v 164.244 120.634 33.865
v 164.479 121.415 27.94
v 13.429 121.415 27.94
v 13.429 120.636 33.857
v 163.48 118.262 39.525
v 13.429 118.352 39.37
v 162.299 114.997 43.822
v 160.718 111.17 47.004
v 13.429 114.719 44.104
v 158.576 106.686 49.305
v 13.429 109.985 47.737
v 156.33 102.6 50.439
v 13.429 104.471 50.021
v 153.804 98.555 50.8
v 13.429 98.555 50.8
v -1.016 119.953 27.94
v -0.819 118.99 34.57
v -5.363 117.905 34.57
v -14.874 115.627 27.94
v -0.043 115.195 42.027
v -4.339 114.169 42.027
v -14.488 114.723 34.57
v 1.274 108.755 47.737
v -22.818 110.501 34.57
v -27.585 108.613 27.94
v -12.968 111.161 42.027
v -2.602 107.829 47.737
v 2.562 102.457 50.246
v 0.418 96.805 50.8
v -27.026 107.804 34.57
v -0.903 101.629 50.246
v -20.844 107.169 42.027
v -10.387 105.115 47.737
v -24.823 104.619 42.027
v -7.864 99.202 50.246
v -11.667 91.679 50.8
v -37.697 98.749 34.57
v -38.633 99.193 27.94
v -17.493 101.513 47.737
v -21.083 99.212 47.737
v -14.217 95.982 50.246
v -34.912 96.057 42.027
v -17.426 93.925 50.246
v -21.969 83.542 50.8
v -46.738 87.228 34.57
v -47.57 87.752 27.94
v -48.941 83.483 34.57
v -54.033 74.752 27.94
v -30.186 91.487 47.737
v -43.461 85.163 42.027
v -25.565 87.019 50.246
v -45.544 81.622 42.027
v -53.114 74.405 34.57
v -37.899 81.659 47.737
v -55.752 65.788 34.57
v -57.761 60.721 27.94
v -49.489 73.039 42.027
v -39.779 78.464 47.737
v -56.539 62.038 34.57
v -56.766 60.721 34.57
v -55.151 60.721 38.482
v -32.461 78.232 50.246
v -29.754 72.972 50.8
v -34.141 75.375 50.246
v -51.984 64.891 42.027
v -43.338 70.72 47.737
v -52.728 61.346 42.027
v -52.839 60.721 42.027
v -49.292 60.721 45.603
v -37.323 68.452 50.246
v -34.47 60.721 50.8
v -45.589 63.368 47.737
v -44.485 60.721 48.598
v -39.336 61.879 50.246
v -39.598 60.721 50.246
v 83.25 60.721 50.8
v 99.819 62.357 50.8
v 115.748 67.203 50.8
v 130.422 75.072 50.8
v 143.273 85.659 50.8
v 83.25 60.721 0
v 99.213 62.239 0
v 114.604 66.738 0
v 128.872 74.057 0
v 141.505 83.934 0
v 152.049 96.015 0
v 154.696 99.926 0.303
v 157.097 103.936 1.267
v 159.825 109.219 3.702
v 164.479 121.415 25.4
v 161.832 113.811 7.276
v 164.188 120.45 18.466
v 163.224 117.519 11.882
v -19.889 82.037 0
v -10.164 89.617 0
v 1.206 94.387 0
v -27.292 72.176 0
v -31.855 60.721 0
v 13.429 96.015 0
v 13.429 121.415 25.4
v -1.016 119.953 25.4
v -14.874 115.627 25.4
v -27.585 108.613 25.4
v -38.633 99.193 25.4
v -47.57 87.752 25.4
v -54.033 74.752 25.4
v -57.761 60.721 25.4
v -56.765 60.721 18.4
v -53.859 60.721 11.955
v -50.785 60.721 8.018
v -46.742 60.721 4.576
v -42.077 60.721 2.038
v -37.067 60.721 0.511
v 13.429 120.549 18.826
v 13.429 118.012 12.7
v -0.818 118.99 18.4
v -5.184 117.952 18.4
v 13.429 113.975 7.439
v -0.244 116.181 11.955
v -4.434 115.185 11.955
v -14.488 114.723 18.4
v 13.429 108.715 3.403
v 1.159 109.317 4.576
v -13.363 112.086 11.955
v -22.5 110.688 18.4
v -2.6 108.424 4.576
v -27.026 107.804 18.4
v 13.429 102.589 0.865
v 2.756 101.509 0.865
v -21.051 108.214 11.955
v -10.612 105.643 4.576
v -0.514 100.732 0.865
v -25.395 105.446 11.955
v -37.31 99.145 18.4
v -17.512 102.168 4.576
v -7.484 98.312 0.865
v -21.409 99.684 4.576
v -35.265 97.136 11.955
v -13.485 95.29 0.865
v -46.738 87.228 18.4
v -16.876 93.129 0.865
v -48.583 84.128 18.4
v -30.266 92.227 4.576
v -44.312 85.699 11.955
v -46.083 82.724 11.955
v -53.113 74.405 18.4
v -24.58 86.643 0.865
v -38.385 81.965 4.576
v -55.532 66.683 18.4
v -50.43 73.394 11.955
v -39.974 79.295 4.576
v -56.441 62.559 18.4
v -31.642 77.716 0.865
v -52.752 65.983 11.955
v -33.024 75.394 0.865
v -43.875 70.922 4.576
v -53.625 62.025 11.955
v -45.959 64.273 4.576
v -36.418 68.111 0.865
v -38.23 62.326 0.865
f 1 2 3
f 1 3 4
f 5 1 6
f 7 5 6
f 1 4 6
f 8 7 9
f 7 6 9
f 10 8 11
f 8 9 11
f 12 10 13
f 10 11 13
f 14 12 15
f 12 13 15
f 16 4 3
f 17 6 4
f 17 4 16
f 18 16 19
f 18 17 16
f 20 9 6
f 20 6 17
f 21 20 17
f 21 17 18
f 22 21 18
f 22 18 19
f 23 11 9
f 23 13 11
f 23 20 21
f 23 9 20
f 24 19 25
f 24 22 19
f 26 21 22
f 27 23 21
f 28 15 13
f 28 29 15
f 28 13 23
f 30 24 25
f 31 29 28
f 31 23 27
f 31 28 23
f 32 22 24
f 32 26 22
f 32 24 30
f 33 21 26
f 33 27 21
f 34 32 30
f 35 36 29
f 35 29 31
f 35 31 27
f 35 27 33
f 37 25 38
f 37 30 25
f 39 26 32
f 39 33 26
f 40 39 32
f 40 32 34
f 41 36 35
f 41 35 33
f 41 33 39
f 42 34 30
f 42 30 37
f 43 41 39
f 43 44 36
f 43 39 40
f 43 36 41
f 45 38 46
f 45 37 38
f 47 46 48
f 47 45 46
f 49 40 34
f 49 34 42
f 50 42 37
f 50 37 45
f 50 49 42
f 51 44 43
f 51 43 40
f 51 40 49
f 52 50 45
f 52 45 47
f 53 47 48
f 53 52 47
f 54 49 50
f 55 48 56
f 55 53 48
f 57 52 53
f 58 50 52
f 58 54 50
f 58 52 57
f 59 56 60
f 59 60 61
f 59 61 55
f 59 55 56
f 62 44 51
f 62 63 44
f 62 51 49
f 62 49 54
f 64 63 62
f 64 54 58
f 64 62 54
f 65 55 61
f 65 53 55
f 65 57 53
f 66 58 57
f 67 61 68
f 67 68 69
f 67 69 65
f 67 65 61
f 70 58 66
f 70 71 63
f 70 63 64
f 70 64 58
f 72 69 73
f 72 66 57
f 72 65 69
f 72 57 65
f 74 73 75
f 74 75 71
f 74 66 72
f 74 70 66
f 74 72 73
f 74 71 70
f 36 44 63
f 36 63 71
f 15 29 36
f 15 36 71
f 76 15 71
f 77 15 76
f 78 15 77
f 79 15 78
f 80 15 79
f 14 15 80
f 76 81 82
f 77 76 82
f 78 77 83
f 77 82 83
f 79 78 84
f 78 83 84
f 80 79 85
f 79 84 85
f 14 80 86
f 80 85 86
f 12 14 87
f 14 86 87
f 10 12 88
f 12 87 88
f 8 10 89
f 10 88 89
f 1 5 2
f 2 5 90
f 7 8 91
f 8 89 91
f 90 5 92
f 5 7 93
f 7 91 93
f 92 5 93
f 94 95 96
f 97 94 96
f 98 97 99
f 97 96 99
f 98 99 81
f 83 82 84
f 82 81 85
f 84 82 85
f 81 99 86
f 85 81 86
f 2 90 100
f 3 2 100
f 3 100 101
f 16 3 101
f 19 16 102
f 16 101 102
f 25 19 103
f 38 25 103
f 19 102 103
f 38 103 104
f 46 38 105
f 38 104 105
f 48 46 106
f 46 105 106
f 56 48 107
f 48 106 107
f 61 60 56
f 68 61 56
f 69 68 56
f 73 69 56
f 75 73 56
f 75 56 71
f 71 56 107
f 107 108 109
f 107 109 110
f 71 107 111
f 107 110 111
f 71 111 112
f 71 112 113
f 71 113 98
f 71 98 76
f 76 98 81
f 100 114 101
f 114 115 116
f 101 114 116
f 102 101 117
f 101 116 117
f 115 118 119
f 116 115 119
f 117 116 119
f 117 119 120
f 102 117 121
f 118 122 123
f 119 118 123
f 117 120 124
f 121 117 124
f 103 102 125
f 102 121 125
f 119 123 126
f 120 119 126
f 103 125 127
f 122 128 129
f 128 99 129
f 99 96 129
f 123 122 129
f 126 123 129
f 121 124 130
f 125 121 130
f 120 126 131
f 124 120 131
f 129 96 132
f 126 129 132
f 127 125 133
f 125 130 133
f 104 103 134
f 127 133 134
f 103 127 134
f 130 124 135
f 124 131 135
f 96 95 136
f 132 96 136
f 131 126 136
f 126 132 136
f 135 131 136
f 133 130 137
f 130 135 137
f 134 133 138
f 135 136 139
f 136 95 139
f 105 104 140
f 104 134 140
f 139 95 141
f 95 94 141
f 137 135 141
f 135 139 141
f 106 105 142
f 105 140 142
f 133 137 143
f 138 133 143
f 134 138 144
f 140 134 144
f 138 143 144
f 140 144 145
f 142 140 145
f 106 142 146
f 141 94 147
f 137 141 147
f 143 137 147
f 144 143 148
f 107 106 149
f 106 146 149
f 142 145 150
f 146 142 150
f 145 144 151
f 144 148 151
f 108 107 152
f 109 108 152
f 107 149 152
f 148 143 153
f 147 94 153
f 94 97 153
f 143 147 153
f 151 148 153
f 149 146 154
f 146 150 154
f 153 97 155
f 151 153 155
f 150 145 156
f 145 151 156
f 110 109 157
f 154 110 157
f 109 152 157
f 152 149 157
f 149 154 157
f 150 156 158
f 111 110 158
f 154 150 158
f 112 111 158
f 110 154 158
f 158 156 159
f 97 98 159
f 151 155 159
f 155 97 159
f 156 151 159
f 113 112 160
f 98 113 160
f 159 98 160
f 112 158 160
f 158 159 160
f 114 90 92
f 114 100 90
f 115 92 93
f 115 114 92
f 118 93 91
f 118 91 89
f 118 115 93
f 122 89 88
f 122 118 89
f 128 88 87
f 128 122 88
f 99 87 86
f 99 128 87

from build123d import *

# Parameters (mm, degrees)
F1_DEPTH = 50.8
F2_R     = 22.86
F3_R     = 25.4


with BuildPart() as f1:
    # F0 (on Top) → F1 (new body)
    with BuildSketch(Plane.XY):
        with BuildLine():
            ThreePointArc((13.428768, 121.414845), (-33.346659, 104.181794), (-57.761153, 60.720879))
            Line((-57.761153, 60.720879), (83.249649, 60.720879))
            ThreePointArc((83.249649, 60.720879), (133.949731, 77.570215), (164.479175, 121.414845))
            Line((164.479175, 121.414845), (13.428768, 121.414845))
        make_face()
    extrude(amount=F1_DEPTH)

    # F2
    f2_edges = [f1.edges().sort_by_distance(p)[0] for p in [
        (-33.346659, 104.181794, 50.8),
        (88.953971, 121.414845, 50.8),
    ]]
    fillet(f2_edges, radius=F2_R)

    # F3
    f3_edges = [f1.edges().sort_by_distance(p)[0] for p in [
        (88.953971, 121.414845, 0),
        (-33.346659, 104.181794, 0),
    ]]
    fillet(f3_edges, radius=F3_R)


solid = f1.part
